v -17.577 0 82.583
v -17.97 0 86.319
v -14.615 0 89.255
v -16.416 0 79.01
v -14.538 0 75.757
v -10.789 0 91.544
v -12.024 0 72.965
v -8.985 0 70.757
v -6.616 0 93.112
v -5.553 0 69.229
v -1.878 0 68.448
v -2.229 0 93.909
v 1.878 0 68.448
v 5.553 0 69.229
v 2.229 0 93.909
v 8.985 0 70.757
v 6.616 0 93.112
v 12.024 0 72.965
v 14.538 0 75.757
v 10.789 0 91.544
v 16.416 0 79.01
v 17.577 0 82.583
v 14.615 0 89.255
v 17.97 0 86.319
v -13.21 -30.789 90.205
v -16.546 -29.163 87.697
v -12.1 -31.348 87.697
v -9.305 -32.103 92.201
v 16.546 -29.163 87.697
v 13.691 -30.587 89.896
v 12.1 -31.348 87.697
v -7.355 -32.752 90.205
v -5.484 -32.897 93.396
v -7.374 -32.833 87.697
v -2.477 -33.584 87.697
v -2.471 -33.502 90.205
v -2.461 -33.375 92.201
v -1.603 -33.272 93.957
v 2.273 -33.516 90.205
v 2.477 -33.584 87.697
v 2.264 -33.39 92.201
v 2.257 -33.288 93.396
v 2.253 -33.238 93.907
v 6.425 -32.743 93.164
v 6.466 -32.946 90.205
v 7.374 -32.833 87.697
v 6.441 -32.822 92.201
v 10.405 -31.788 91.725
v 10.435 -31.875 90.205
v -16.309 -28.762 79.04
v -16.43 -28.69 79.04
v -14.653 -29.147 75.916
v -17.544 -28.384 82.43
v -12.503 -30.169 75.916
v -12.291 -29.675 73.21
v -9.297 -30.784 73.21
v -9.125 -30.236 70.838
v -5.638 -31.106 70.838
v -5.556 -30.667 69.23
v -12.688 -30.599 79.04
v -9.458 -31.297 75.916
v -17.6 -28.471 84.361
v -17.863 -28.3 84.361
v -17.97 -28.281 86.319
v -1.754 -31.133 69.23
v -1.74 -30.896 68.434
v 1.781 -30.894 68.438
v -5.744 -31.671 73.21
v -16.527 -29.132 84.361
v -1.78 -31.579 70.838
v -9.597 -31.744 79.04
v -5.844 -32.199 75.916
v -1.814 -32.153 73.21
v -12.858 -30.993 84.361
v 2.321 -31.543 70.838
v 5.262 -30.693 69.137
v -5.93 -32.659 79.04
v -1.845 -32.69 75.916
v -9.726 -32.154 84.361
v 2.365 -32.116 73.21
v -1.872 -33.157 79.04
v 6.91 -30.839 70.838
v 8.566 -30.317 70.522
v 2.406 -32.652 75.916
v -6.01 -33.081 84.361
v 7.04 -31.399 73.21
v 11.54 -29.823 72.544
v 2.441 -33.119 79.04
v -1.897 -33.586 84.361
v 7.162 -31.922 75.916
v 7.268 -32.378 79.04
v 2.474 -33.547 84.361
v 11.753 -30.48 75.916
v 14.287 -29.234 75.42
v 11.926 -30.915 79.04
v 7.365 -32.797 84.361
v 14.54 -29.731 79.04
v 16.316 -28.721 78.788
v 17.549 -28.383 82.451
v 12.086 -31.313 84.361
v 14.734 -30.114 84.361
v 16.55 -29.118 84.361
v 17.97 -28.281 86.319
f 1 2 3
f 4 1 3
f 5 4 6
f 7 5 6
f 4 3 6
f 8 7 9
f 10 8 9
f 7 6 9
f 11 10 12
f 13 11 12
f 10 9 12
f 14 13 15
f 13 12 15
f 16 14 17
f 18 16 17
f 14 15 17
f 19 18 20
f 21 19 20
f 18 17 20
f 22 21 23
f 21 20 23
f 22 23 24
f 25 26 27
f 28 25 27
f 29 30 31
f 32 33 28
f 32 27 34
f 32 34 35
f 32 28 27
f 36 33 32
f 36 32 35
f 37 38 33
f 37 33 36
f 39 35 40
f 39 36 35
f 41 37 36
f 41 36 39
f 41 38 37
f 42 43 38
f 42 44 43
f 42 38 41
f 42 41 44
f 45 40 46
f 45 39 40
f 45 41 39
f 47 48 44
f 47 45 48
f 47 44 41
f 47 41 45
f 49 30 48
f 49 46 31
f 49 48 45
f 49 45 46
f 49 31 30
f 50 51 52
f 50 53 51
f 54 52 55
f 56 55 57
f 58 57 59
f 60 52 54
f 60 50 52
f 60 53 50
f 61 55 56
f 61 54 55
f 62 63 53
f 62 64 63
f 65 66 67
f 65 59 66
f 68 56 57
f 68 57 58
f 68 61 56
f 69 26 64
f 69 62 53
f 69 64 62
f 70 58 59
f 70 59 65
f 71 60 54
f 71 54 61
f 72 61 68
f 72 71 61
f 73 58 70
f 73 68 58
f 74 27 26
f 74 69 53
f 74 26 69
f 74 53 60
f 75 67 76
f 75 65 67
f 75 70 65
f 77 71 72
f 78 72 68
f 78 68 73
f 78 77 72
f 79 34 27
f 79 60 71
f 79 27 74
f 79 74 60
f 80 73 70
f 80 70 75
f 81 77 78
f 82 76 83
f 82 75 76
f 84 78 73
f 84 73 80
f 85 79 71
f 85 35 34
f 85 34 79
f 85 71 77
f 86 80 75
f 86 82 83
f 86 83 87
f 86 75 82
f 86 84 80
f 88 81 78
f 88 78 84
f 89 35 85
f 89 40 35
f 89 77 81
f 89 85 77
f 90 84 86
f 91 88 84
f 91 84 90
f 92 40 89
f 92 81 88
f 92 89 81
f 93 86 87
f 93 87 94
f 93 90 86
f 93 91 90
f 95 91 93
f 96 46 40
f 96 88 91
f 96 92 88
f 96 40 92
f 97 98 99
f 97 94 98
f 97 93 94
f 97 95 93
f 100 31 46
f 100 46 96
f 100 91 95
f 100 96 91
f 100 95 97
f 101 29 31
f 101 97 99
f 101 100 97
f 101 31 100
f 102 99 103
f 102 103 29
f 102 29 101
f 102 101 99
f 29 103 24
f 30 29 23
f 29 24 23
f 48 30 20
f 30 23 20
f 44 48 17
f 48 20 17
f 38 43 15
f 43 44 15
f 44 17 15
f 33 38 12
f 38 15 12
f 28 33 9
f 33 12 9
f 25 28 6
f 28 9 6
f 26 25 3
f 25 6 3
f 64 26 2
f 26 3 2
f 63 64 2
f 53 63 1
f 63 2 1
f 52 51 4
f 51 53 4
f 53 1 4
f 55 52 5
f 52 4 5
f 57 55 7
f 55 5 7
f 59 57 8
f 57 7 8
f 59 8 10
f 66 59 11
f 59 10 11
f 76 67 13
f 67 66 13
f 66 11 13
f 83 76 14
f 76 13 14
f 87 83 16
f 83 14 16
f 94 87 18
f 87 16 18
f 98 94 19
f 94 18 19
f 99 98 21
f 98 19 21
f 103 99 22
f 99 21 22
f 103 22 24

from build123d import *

# Parameters (mm, degrees)
EXTRUDE008_DEPTH = 100


with BuildPart() as body009:
    # Sketch045 → Revolution002 (revolve)
    with BuildSketch(Plane.XZ):
        with BuildLine():
            Line((0, 0), (0, 135.563389))
            ThreePointArc((23.86226, 121.281178), (13.904936, 131.720055), (0, 135.563389))
            ThreePointArc((32.577943, 87.696618), (30.229669, 105.01041), (23.86226, 121.281178))
            ThreePointArc((22.101567, 52.101534), (30.047255, 69.102202), (32.577943, 87.696618))
            ThreePointArc((22.101567, 52.101534), (13.488015, 26.476163), (18.952965, 0))
            Line((0, 0), (18.952965, 0))
        make_face()
    revolve(axis=Axis((0, 0, 0), (0, 0, 1)))


with BuildPart() as body009_1:
    # Clone010 placement: moved
    add(body009.part.moved(Location((0, -1.1, 0))))


with BuildPart() as common007:
    # Sketch056 → Extrude008 (new body)
    with BuildSketch(Plane.XZ):
        with BuildLine():
            ThreePointArc((-17.97, 86.319116), (0, 68.349116), (17.97, 86.319116))
            ThreePointArc((17.97, 86.319116), (0, 94.009169), (-17.97, 86.319116))
        make_face()
    extrude(amount=EXTRUDE008_DEPTH)

    # Common007: intersect Body009
    add(body009_1.part, mode=Mode.INTERSECT)


solid = common007.part
